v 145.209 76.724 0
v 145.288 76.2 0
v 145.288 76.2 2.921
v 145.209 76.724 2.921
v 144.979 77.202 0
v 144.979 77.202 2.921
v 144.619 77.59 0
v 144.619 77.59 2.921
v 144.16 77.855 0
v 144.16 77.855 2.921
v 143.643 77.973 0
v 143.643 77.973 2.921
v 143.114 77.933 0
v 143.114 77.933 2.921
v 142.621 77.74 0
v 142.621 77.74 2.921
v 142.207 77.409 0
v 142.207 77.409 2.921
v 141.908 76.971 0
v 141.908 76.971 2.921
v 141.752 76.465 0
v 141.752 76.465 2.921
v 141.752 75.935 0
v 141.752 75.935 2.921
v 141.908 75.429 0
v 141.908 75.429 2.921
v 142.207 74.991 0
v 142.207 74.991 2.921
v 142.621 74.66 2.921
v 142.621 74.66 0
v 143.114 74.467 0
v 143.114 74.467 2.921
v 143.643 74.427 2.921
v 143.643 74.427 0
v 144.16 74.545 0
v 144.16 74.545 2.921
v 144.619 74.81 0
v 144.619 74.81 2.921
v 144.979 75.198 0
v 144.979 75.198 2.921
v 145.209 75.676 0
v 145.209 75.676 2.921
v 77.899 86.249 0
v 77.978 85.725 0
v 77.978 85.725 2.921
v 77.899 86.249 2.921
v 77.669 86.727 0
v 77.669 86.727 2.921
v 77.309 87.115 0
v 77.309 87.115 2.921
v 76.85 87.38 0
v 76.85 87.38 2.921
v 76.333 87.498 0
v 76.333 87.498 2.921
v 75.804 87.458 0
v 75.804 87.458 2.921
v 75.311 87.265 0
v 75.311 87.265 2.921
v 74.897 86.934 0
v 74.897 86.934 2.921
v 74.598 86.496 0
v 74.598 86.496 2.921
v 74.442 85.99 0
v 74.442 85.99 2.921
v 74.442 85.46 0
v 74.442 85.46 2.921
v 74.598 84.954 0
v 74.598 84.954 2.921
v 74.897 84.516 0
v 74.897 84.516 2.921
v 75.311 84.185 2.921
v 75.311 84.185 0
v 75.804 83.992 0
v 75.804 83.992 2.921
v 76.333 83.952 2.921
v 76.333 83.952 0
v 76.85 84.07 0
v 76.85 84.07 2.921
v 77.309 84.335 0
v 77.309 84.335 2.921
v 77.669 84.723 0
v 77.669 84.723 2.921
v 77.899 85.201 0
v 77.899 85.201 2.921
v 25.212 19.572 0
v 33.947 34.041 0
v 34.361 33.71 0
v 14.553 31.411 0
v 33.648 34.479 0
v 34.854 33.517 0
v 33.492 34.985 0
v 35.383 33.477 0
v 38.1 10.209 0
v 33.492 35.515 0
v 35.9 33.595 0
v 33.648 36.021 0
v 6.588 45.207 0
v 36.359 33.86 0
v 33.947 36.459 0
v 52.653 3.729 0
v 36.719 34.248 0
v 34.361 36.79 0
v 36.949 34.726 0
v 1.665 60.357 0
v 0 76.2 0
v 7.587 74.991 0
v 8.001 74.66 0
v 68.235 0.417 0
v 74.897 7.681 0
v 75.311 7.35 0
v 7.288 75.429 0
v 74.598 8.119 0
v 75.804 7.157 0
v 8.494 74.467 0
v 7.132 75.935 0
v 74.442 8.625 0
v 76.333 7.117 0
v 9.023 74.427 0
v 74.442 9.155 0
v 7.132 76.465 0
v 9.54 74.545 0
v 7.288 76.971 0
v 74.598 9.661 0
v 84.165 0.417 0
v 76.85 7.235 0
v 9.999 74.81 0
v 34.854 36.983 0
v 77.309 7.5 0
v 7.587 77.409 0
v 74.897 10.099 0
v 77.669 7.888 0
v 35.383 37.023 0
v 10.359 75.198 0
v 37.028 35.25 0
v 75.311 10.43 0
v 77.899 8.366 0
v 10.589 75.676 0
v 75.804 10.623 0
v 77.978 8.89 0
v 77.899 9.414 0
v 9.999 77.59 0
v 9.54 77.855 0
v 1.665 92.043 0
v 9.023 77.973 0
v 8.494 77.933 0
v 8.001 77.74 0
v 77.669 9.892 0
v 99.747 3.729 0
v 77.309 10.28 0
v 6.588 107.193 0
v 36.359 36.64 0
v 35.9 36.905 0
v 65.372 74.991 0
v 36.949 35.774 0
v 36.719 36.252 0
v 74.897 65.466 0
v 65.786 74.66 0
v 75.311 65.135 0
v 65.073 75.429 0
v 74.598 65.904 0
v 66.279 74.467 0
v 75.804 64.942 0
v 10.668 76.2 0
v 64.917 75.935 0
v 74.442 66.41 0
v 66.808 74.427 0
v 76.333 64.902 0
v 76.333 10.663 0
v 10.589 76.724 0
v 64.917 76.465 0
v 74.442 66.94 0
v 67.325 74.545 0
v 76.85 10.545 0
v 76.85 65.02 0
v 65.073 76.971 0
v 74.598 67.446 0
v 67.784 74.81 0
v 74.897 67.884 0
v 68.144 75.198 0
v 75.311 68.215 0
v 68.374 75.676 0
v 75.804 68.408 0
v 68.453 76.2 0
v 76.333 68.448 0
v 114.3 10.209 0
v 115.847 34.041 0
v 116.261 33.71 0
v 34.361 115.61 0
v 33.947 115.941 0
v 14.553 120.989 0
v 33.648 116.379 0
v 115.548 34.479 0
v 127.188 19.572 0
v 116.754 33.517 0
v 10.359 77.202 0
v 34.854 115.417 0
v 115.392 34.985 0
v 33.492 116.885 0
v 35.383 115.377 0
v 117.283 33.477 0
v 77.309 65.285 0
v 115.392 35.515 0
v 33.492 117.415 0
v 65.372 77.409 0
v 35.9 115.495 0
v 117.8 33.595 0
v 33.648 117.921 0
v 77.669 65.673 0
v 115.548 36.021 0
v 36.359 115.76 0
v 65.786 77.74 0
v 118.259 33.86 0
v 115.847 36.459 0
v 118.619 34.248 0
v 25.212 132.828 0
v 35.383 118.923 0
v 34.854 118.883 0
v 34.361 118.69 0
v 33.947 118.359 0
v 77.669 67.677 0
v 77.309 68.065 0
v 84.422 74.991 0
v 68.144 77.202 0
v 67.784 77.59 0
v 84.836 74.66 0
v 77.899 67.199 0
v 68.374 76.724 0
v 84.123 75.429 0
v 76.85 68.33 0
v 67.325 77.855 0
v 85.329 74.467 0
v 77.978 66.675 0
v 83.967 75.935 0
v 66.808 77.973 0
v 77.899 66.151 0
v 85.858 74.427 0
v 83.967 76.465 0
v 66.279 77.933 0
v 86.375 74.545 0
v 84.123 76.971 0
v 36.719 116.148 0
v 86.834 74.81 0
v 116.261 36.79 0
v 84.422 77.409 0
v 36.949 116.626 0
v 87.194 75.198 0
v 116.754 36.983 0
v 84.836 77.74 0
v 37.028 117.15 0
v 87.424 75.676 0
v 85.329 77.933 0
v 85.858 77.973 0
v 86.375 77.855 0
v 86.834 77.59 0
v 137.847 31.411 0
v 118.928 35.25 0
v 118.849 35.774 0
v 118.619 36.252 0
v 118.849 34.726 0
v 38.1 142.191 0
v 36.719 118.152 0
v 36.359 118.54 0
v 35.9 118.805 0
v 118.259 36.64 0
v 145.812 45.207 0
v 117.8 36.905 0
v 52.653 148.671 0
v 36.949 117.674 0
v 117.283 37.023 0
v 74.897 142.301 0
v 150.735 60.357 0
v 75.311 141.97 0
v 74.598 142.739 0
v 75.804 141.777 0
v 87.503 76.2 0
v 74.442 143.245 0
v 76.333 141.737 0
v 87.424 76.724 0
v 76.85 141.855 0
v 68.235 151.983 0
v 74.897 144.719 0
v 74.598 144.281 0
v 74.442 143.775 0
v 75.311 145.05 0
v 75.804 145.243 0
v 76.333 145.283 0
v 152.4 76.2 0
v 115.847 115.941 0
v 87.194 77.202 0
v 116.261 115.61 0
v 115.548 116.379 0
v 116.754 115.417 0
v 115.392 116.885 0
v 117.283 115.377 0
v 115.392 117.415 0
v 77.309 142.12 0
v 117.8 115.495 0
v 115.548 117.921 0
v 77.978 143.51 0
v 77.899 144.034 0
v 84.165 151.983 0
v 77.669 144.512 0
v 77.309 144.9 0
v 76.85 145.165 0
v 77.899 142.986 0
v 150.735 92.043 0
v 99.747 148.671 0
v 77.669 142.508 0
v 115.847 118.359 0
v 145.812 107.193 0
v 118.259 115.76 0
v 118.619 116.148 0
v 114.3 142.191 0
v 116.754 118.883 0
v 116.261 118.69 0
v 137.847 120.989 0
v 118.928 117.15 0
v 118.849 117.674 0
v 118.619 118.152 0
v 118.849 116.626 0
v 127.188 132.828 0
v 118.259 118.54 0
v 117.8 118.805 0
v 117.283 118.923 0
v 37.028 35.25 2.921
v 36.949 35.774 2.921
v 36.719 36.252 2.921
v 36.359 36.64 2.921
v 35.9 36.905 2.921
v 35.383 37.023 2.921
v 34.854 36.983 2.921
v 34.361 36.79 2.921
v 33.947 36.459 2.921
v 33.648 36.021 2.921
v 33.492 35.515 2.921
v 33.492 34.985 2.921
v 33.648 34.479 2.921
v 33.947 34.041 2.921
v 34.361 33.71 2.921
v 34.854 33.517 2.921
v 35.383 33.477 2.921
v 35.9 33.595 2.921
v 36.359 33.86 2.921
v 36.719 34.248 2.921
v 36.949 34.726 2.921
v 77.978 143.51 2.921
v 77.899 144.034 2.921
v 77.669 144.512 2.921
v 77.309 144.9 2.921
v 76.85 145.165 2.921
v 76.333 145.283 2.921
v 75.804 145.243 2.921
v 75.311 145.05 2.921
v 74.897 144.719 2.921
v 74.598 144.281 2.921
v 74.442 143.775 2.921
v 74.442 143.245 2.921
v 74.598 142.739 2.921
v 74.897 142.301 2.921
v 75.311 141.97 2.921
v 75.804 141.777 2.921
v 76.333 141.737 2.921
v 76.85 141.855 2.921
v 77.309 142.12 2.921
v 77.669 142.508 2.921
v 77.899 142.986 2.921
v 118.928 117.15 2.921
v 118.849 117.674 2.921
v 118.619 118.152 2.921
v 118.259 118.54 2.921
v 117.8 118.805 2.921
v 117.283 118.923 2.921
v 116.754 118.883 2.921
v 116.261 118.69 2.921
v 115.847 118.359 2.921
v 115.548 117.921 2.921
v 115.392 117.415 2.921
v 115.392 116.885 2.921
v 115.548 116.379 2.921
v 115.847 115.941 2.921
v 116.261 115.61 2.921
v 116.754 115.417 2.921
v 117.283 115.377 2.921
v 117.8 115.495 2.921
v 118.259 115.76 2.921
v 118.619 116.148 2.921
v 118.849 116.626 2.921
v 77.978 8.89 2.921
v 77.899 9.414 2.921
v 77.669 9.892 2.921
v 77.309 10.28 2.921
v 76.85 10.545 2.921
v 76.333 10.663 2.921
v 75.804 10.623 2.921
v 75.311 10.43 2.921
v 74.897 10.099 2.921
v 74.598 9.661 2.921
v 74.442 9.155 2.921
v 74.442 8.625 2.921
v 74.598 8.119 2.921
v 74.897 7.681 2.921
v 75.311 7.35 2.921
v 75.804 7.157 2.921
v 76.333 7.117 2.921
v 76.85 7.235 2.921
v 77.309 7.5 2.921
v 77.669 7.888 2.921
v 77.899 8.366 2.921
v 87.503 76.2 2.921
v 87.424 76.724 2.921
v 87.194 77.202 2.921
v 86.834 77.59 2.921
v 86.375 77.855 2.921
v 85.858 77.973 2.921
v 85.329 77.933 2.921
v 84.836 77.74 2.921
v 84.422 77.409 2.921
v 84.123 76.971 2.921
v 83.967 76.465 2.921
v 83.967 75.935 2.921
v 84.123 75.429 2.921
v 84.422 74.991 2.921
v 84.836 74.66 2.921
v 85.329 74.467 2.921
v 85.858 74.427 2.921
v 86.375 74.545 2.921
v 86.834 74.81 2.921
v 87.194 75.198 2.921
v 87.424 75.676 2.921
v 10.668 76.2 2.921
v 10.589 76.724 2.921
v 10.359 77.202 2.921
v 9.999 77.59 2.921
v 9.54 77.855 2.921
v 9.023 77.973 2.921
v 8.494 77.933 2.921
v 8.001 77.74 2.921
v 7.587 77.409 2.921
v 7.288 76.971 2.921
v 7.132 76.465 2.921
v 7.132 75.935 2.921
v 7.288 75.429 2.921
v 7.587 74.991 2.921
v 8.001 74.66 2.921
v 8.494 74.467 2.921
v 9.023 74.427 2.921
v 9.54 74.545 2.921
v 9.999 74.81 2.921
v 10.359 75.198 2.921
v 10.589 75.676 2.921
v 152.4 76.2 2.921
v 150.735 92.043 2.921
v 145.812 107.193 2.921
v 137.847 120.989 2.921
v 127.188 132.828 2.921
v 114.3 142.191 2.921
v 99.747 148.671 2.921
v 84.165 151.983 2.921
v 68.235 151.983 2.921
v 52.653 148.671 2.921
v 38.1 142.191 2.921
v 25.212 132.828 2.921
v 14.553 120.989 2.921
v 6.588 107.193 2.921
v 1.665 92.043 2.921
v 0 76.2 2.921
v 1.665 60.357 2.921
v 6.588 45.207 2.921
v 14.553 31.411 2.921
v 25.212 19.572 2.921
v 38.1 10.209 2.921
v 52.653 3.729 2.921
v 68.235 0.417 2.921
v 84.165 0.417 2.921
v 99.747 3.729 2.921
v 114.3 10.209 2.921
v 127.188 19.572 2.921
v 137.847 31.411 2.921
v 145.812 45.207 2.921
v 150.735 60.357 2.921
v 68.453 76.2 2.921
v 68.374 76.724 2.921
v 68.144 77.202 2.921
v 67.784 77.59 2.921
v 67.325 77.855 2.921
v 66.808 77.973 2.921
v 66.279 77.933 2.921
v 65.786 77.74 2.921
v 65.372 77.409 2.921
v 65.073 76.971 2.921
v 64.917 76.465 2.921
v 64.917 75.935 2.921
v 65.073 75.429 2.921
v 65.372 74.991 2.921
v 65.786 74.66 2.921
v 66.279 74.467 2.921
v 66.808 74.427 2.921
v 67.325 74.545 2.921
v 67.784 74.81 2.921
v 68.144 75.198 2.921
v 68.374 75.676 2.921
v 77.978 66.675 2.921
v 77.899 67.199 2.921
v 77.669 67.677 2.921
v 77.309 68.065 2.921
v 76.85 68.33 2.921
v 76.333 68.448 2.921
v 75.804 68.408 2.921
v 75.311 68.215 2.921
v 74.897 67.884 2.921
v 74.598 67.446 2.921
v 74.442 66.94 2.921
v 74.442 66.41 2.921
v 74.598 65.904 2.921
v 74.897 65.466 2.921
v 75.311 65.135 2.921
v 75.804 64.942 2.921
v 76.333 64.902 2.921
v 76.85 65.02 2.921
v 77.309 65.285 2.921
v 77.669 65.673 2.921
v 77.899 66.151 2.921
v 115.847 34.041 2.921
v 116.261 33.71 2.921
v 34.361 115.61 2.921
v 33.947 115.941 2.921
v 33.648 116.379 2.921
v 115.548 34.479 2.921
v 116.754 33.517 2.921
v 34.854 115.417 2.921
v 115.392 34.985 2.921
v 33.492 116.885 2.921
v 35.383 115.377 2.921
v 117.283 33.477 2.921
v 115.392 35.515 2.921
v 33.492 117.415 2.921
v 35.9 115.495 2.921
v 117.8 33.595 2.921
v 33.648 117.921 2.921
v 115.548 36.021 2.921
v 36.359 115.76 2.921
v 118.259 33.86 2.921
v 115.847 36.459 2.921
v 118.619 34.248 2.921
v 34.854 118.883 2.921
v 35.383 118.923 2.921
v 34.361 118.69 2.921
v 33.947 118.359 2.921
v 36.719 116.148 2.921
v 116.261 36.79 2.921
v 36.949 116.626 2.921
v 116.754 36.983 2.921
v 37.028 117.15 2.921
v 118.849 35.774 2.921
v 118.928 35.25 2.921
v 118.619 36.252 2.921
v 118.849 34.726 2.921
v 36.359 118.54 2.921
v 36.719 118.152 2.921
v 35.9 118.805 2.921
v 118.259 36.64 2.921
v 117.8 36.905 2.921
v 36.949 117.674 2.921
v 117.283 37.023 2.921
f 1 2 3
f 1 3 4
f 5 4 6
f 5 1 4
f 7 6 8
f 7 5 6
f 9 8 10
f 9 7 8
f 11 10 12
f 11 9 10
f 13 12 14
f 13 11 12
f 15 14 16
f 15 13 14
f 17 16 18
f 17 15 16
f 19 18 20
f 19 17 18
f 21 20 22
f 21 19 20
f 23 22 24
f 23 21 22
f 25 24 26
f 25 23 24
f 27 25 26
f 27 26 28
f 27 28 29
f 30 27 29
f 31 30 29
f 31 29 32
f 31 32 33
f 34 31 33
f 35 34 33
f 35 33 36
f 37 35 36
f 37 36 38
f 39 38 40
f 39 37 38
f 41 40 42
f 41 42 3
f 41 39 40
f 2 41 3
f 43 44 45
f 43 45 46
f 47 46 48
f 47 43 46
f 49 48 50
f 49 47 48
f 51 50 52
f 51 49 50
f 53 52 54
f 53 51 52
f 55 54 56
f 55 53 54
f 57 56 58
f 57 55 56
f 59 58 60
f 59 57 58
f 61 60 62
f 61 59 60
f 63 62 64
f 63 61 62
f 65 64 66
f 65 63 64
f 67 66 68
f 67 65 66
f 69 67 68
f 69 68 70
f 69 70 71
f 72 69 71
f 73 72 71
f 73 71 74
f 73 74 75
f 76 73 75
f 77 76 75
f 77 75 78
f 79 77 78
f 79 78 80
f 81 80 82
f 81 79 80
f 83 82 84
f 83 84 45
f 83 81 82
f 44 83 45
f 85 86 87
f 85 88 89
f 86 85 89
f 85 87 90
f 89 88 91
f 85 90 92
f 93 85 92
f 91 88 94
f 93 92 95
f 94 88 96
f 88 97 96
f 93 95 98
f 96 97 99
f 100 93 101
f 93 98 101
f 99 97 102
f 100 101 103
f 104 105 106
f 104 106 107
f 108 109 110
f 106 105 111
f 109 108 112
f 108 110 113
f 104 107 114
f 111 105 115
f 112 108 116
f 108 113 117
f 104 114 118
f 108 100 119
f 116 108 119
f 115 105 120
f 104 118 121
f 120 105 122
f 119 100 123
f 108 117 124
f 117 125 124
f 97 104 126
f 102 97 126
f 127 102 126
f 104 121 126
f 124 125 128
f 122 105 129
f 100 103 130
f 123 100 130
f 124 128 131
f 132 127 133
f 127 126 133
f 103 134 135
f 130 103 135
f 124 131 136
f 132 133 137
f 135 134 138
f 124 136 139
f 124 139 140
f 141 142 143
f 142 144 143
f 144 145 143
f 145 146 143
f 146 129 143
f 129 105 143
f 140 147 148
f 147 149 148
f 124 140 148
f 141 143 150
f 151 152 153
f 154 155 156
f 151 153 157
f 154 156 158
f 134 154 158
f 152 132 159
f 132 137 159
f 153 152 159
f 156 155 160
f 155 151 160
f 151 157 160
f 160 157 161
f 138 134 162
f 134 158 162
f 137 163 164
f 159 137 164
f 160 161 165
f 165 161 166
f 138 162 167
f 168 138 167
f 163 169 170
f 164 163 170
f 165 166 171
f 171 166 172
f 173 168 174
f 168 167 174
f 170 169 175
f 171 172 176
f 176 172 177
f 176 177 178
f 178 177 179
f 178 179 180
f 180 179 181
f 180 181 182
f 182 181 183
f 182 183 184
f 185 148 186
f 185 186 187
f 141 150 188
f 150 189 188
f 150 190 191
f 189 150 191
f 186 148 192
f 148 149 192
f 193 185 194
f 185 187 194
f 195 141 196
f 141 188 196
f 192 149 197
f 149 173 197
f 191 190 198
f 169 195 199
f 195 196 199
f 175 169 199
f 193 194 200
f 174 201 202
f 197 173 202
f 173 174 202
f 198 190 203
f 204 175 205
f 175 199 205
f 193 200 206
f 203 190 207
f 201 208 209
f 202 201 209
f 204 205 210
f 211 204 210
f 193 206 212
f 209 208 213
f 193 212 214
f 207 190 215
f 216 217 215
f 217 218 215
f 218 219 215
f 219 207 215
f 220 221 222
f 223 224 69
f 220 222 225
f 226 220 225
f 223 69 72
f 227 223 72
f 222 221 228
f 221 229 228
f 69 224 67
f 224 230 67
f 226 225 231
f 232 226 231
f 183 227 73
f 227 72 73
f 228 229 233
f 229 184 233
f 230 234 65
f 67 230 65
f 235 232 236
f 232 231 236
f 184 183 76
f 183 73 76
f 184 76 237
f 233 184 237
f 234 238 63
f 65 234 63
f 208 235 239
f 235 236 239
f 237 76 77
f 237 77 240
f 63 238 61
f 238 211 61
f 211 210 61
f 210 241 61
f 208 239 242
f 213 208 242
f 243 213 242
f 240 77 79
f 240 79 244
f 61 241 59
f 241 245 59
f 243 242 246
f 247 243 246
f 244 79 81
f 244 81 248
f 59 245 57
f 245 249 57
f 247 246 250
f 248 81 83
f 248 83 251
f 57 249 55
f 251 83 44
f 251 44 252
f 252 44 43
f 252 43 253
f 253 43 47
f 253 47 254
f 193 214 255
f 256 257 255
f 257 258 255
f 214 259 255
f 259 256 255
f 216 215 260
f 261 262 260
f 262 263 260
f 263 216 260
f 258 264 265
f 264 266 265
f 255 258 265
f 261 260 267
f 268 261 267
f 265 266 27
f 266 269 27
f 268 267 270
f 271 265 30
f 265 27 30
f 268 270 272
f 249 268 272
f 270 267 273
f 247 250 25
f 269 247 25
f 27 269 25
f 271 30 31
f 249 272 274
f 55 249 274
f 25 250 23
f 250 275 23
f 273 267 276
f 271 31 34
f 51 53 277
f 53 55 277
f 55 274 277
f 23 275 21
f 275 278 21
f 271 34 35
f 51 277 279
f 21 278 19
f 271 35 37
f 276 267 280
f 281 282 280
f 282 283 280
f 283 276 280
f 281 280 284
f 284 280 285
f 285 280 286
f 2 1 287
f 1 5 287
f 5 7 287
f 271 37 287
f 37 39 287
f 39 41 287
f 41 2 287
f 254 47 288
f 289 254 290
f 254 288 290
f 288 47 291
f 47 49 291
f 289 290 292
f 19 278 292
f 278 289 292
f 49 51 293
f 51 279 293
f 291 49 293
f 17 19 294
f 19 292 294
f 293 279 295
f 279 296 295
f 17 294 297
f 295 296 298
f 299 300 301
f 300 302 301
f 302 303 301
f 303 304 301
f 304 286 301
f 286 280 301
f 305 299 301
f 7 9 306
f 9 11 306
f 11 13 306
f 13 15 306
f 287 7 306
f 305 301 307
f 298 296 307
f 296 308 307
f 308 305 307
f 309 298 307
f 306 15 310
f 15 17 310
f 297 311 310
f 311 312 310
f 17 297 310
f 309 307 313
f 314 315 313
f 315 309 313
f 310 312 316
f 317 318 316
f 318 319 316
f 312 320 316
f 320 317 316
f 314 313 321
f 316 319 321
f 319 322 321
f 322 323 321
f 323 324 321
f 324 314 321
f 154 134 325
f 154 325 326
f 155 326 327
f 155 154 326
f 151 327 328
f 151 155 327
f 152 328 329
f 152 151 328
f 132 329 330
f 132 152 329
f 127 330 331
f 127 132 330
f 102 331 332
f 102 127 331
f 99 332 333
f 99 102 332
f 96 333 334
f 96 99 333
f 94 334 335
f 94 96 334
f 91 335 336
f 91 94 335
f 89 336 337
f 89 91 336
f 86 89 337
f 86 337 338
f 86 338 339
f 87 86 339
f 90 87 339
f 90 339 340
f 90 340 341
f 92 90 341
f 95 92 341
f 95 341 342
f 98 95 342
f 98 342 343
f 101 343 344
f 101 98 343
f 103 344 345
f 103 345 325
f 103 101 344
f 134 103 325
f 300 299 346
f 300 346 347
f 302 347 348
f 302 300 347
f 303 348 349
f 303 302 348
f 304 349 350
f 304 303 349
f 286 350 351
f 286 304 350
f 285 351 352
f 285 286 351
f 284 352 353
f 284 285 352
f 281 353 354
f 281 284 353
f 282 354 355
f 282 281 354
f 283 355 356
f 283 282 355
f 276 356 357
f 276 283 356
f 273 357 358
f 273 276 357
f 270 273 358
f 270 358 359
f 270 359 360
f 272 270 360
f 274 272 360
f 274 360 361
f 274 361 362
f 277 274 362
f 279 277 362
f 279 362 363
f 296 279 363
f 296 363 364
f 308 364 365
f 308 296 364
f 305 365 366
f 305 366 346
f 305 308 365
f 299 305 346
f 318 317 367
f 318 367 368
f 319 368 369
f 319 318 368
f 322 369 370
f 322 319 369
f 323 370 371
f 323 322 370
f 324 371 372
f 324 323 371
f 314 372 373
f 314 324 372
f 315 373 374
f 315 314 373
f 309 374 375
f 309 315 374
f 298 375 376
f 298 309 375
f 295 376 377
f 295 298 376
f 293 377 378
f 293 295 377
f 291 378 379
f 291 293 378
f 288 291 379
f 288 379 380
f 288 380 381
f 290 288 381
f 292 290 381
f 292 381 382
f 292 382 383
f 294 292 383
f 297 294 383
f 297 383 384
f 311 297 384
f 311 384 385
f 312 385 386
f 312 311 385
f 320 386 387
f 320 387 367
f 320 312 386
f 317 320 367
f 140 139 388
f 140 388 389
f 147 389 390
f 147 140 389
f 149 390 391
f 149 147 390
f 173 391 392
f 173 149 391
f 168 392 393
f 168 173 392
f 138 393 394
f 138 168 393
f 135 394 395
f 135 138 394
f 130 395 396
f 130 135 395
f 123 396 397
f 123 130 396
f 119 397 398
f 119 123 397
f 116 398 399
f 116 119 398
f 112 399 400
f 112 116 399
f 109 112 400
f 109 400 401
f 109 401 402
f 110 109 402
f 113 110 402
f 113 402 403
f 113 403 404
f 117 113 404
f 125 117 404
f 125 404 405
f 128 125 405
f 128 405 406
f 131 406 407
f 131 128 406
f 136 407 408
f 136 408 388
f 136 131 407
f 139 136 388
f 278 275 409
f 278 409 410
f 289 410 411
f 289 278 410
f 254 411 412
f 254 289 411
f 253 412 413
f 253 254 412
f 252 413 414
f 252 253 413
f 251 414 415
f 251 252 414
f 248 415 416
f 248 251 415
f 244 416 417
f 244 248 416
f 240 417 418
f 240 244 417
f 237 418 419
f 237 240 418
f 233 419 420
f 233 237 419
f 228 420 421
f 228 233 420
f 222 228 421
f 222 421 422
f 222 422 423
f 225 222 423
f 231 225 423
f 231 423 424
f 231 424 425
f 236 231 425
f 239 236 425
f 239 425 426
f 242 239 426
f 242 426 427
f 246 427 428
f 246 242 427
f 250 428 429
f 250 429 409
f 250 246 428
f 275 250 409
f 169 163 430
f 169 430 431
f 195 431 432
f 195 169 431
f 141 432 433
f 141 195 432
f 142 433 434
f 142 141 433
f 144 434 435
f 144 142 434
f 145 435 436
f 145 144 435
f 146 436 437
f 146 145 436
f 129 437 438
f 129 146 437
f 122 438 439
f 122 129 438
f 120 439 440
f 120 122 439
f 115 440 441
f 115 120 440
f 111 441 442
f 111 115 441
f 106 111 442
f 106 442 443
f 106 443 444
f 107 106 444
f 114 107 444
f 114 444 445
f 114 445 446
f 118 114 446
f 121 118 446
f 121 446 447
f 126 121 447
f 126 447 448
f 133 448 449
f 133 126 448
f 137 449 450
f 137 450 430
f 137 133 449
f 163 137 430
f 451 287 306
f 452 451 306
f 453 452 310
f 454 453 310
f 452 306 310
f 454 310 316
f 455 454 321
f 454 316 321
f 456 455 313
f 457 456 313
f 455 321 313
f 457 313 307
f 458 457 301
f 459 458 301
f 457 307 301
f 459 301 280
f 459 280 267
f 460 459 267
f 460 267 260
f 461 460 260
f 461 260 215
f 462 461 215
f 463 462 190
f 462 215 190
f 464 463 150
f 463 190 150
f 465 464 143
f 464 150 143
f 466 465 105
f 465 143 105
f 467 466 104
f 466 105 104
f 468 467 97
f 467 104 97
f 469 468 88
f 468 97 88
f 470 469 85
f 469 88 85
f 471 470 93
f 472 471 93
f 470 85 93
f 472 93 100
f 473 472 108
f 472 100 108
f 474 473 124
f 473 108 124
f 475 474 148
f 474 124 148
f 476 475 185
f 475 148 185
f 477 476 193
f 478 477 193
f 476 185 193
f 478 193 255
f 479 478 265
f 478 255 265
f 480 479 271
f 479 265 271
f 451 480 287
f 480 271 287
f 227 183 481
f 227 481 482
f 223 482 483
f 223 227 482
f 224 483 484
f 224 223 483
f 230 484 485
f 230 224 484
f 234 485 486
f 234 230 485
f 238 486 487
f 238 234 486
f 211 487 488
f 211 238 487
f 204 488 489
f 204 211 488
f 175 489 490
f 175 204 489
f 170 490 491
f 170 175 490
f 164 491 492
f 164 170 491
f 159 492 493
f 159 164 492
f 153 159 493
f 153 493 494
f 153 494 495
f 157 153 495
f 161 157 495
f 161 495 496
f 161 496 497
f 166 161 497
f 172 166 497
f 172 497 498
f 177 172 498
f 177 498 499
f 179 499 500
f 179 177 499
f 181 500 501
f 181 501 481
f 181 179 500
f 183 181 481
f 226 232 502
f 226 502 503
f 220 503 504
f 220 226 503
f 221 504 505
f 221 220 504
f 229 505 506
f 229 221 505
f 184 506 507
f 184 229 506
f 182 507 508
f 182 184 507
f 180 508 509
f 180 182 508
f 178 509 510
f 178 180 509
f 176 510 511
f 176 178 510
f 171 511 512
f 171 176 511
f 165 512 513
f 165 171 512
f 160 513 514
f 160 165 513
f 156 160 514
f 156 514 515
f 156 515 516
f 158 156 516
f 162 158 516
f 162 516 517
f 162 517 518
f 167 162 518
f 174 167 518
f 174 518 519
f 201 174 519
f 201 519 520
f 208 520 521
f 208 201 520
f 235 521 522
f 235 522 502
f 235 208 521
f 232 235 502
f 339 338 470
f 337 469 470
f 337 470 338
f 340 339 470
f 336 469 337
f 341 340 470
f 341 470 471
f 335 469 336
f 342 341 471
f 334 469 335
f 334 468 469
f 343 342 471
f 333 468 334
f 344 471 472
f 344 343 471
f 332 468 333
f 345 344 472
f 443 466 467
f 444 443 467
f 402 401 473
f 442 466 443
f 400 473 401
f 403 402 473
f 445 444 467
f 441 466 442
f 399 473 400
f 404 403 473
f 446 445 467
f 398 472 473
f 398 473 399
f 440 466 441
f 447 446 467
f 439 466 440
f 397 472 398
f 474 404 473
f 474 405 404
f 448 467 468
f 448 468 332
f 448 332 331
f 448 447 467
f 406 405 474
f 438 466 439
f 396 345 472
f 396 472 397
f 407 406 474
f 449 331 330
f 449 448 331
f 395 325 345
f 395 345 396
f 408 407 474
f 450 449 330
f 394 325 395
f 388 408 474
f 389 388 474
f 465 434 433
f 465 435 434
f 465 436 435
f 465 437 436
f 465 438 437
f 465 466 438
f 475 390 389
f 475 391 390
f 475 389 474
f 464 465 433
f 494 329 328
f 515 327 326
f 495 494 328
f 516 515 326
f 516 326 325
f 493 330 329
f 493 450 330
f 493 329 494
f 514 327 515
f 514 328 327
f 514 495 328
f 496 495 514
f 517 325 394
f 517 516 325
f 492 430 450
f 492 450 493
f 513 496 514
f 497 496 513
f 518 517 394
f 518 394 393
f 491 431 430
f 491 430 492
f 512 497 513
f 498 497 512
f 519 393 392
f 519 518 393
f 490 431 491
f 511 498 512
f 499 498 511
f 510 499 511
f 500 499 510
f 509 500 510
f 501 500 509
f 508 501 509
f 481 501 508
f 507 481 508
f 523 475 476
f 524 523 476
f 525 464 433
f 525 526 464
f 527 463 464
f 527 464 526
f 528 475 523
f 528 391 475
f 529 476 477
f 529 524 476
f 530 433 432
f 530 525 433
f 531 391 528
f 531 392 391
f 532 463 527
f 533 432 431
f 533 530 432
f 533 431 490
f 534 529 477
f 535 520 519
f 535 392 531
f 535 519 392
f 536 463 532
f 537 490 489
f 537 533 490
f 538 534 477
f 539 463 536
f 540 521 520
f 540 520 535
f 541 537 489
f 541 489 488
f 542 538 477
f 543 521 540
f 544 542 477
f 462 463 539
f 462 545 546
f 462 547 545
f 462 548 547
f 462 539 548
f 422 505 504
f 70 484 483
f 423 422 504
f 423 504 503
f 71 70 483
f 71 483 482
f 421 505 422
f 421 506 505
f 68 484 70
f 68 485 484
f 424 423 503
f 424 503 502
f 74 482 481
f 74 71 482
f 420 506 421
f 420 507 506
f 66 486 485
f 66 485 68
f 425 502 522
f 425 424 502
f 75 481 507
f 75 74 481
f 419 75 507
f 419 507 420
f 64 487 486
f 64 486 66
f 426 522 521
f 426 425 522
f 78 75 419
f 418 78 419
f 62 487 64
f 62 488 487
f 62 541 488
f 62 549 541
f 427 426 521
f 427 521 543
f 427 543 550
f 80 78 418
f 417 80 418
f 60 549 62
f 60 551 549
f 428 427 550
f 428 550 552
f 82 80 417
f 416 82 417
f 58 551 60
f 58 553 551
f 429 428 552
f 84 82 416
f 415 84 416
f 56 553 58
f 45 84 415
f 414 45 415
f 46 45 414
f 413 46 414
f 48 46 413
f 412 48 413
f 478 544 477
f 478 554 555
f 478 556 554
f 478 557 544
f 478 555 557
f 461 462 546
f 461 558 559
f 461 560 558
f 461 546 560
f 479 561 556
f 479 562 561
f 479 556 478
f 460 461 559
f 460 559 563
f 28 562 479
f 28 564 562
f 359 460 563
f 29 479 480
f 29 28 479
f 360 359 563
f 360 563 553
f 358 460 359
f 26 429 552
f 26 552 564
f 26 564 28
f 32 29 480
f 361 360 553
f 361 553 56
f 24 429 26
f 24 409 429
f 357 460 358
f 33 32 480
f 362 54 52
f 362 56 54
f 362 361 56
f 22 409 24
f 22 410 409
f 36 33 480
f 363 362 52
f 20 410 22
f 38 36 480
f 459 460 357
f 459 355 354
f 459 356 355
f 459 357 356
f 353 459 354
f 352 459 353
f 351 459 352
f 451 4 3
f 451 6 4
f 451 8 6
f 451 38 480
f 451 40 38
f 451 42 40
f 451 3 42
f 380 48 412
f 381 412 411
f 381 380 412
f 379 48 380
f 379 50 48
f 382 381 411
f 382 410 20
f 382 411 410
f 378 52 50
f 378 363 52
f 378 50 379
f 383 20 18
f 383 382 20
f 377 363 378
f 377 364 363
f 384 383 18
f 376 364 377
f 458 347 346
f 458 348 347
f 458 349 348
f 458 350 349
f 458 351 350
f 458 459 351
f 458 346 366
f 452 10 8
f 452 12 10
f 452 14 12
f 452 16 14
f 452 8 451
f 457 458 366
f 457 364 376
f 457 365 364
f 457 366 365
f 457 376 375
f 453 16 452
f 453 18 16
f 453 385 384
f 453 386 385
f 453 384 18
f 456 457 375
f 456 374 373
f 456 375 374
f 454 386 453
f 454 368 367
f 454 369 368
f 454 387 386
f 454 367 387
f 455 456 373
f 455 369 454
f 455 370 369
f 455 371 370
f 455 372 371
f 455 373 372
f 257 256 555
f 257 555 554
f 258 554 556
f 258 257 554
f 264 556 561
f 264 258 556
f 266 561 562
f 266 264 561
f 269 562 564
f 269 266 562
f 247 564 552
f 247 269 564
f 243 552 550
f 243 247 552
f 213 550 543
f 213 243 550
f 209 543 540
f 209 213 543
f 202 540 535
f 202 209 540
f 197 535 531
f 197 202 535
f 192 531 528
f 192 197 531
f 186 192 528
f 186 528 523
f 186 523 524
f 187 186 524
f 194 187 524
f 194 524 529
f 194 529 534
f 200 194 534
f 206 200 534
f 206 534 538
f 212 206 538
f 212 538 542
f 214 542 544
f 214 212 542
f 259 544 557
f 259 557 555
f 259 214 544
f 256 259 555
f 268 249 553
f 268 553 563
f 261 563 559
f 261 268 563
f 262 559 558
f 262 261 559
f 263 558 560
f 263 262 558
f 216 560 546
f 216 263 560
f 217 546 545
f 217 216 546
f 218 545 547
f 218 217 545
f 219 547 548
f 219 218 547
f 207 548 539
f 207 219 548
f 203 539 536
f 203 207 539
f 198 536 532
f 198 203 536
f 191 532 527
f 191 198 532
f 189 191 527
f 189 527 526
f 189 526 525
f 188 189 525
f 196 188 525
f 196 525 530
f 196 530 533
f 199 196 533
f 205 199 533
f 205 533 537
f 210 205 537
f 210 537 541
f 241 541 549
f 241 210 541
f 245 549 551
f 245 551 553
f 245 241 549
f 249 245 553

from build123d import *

# Parameters (mm, degrees)
F0_R     = 76.2
F0_R_2   = 1.778
F1_DEPTH = 2.921


with BuildPart() as f1:
    # F0 (on Top) → F1 (new body)
    with BuildSketch(Plane.XY):
        with Locations((76.2, 76.2)):
            Circle(F0_R)
        with Locations((35.250032, 35.250032)):
            Circle(F0_R_2, mode=Mode.SUBTRACT)
        with Locations((76.2, 8.89)):
            Circle(F0_R_2, mode=Mode.SUBTRACT)
        with Locations((117.149968, 35.250032)):
            Circle(F0_R_2, mode=Mode.SUBTRACT)
        with Locations((76.2, 66.675)):
            Circle(F0_R_2, mode=Mode.SUBTRACT)
        with Locations((8.89, 76.2)):
            Circle(F0_R_2, mode=Mode.SUBTRACT)
        with Locations((66.675, 76.2)):
            Circle(F0_R_2, mode=Mode.SUBTRACT)
        with Locations((35.250032, 117.149968)):
            Circle(F0_R_2, mode=Mode.SUBTRACT)
        with Locations((85.725, 76.2)):
            Circle(F0_R_2, mode=Mode.SUBTRACT)
        with Locations((76.2, 85.725)):
            Circle(F0_R_2, mode=Mode.SUBTRACT)
        with Locations((143.51, 76.2)):
            Circle(F0_R_2, mode=Mode.SUBTRACT)
        with Locations((76.2, 143.51)):
            Circle(F0_R_2, mode=Mode.SUBTRACT)
        with Locations((117.149968, 117.149968)):
            Circle(F0_R_2, mode=Mode.SUBTRACT)
    extrude(amount=F1_DEPTH)


solid = f1.part
